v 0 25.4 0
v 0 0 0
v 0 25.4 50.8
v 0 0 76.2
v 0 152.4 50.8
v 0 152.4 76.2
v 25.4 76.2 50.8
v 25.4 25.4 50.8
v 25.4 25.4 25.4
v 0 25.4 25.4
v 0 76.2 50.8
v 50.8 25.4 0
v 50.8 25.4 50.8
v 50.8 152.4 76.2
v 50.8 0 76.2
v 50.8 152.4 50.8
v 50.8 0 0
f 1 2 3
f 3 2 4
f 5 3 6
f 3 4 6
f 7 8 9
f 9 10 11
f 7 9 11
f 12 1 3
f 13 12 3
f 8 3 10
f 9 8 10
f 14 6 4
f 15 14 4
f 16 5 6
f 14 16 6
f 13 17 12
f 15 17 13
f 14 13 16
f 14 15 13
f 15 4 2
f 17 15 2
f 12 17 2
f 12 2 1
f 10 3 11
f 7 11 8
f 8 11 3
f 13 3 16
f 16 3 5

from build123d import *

# Parameters (mm, degrees)
F1_DEPTH = 50.8
F3_DEPTH = 25.4


with BuildPart() as f1:
    # F0 (on Right) → F1 (new body)
    with BuildSketch(Plane.YZ):
        Polygon((0, 76.2), (0, 0), (25.4, 0), (25.4, 50.8), (152.4, 50.8), (152.4, 76.2), align=None)
    extrude(amount=F1_DEPTH)


with BuildPart() as f3:
    # F2 (on Right) → F3 (new body)
    with BuildSketch(Plane.YZ):
        Polygon((76.2, 50.8), (25.4, 50.8), (25.4, 25.4), align=None)
    extrude(amount=F3_DEPTH)


solid = Compound([f1.part, f3.part])
